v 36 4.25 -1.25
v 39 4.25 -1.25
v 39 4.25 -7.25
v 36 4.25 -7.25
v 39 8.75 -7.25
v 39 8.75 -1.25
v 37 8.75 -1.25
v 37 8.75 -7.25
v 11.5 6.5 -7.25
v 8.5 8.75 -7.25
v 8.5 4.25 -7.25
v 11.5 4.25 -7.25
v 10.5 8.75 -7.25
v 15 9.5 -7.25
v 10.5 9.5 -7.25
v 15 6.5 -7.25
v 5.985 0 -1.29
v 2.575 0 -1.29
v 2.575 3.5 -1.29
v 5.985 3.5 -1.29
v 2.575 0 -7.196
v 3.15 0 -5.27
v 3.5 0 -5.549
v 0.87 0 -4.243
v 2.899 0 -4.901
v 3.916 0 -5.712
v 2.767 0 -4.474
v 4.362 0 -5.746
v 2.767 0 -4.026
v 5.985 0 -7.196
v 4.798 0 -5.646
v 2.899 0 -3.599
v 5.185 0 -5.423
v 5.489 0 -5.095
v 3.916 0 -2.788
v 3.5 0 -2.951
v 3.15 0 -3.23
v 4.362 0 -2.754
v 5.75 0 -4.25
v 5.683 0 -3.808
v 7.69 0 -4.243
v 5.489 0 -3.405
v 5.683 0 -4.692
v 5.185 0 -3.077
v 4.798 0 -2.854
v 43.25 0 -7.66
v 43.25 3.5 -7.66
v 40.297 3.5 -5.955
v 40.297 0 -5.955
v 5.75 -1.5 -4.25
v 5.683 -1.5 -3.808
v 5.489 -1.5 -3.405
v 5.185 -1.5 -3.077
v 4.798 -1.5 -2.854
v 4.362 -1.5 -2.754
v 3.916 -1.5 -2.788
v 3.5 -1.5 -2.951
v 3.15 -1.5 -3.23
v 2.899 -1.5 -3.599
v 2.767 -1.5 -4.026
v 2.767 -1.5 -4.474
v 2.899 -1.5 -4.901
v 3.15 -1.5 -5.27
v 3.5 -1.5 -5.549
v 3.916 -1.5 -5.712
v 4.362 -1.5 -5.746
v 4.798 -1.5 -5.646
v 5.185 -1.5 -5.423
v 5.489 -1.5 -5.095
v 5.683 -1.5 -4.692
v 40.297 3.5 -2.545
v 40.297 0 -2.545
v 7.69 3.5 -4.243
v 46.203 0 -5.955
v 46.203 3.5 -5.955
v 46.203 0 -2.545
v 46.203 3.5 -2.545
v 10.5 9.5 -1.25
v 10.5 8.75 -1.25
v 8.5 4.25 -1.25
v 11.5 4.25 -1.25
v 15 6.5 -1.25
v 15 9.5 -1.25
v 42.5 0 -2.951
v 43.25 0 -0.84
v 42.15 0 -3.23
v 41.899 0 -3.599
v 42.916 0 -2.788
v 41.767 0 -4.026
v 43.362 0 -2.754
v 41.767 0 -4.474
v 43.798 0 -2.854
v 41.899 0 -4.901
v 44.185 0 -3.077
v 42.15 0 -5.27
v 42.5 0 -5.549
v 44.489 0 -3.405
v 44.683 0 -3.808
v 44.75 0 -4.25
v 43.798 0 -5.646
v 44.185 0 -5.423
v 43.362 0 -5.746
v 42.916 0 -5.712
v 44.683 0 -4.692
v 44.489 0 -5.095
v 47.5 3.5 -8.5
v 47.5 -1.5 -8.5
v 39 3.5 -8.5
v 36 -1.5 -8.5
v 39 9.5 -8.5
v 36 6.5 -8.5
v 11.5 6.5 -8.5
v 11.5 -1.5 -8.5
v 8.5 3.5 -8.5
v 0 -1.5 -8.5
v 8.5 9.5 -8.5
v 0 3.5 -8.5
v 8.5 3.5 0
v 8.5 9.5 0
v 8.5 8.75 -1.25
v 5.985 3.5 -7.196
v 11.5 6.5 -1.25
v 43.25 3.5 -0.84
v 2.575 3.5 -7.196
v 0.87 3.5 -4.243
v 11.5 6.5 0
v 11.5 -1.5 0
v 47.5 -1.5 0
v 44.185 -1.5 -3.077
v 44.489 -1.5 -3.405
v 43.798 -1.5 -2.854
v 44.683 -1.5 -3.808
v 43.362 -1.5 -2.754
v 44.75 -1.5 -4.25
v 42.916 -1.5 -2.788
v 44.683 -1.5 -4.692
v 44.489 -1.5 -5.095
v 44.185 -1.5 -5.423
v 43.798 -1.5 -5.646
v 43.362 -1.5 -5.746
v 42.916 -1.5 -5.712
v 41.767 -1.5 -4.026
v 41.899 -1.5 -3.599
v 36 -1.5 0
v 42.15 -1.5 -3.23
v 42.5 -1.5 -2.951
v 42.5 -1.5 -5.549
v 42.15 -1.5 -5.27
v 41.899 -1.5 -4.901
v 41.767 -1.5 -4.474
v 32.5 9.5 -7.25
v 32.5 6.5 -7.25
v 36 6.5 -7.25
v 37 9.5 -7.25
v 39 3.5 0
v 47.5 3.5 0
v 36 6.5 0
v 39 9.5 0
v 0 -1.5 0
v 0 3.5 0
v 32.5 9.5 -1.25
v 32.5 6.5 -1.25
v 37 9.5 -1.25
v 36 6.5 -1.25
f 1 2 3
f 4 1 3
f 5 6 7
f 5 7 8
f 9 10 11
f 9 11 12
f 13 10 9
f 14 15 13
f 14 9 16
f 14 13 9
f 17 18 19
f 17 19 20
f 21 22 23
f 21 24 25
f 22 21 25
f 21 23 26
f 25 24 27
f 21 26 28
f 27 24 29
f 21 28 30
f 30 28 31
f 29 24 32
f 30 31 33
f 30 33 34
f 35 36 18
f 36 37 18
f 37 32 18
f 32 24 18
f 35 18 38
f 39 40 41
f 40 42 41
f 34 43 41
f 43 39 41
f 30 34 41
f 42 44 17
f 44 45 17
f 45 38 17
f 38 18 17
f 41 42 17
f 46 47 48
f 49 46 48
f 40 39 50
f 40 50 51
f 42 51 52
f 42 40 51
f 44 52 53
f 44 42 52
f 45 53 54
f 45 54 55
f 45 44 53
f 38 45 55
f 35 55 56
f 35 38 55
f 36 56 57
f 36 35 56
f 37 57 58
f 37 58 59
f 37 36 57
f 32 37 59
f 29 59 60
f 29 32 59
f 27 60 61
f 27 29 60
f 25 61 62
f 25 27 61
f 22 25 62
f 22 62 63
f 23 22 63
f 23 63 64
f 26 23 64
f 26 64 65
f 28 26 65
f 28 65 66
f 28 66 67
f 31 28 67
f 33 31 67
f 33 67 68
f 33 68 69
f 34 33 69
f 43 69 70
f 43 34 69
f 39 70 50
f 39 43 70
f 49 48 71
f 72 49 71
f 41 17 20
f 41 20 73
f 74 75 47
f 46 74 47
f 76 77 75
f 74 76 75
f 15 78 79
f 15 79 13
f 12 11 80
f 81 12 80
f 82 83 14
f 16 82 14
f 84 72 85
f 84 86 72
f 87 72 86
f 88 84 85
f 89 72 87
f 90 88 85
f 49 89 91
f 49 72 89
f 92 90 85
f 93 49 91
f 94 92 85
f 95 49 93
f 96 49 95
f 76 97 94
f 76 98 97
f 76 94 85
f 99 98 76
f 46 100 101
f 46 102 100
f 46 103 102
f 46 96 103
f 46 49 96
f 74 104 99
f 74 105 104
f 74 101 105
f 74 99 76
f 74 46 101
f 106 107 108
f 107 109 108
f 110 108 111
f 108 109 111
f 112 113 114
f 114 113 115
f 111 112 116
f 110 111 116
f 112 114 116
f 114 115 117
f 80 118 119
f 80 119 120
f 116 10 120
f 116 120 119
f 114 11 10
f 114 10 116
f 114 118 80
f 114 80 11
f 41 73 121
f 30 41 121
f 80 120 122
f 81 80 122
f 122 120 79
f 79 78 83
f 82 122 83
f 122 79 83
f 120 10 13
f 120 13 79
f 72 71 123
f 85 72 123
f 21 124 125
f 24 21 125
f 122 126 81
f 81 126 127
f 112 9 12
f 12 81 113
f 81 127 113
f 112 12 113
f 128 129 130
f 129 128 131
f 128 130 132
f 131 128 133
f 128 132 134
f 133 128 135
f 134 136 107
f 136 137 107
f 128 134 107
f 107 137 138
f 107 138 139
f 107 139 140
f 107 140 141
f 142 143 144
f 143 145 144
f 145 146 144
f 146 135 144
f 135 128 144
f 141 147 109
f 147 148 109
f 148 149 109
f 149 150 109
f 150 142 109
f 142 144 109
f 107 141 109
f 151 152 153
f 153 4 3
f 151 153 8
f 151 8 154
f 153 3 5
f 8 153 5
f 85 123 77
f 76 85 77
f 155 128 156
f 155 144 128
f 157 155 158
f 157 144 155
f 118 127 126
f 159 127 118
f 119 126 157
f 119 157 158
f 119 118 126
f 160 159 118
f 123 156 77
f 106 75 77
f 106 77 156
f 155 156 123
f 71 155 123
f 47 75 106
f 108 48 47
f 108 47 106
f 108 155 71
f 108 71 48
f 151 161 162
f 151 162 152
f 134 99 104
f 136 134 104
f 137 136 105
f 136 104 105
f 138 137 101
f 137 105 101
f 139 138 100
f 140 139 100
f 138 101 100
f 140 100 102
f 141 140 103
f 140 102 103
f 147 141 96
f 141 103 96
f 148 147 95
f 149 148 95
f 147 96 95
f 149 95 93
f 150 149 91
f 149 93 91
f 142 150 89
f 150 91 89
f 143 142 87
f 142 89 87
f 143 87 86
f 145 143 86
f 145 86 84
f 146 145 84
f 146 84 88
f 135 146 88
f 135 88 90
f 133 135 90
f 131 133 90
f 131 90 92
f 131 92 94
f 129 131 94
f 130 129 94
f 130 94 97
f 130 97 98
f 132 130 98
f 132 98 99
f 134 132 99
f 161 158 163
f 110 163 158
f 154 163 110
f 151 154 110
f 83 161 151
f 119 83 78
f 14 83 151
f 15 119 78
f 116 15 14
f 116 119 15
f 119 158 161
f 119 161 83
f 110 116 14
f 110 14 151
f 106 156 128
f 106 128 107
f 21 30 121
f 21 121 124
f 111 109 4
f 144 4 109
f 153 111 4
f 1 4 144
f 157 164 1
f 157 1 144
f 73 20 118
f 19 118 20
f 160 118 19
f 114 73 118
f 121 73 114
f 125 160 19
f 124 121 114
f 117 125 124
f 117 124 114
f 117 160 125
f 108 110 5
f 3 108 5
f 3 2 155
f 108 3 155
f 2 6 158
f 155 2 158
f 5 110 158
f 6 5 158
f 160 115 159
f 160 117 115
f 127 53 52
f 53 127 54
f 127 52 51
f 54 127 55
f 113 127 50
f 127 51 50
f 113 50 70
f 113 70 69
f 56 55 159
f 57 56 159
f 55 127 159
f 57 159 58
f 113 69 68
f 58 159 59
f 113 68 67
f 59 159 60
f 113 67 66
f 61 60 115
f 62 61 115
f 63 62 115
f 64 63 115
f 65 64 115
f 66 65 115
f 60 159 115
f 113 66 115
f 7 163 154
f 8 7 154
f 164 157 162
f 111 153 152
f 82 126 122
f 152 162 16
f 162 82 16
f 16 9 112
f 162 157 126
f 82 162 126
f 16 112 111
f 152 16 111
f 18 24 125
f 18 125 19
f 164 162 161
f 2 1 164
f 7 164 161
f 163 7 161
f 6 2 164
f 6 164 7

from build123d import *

# Parameters (mm, degrees)
SKETCH1_W           = 8.5
SKETCH1_H           = 8.5
BOSS_EXTRUDE1_DEPTH = 3.5
SKETCH2_W           = 8.5
SKETCH2_H           = 8.5
SKETCH2_R           = 1.5
BOSS_EXTRUDE2_DEPTH = 1.5
SKETCH3_W           = 8.5
SKETCH3_H           = 5
BOSS_EXTRUDE3_DEPTH = 3
SKETCH4_W           = 3
SKETCH4_H           = 8.5
BOSS_EXTRUDE4_DEPTH = 6
SKETCH5_W           = 8.5
SKETCH5_H           = 3
BOSS_EXTRUDE5_DEPTH = 27.5
SKETCH6_W           = 3
SKETCH6_H           = 8.5
BOSS_EXTRUDE6_DEPTH = 8
SKETCH7_W           = 8.5
SKETCH7_H           = 5
BOSS_EXTRUDE7_DEPTH = 8.5
CUT_EXTRUDE1_DEPTH  = 3.5
SKETCH10_R          = 1.5
CUT_EXTRUDE3_DEPTH  = 3.5
SKETCH11_W          = 6
SKETCH11_H          = 4.5
CUT_EXTRUDE4_DEPTH  = 3.5
SKETCH12_W          = 4.5
SKETCH12_H          = 6
CUT_EXTRUDE5_DEPTH  = 3.5
SKETCH13_W          = 6
SKETCH13_H          = 4.5
CUT_EXTRUDE6_DEPTH  = 3.5
SKETCH14_W          = 4.5
SKETCH14_H          = 6
CUT_EXTRUDE7_DEPTH  = 3.5


with BuildPart() as part:
    # Sketch1 → Boss-Extrude1 (new body)
    with BuildSketch(Plane(origin=(0, 0, 0), x_dir=(1, 0, 0), z_dir=(0, 1, 0))):
        with Locations((4.25, 4.25)):
            Rectangle(SKETCH1_W, SKETCH1_H)
        Polygon((5.985496764, 7.195964334), (2.575496764, 7.195964334), (0.870496764, 4.242817707), (2.575496764, 1.28967108), (5.985496764, 1.28967108), (7.690496764, 4.242817707), align=None, mode=Mode.SUBTRACT)
    extrude(amount=BOSS_EXTRUDE1_DEPTH)

    # Sketch2 → Boss-Extrude2 (add)
    with BuildSketch(Plane.XZ):
        with Locations((4.25, -4.25)):
            Rectangle(SKETCH2_W, SKETCH2_H)
        with Locations((4.25, -4.25)):
            Circle(SKETCH2_R, mode=Mode.SUBTRACT)
    extrude(amount=BOSS_EXTRUDE2_DEPTH)

    # Sketch3 → Boss-Extrude3 (add)
    with BuildSketch(Plane(origin=(8.5, 0, 0), x_dir=(0, 0, -1), z_dir=(1, 0, 0))):
        with Locations((4.25, 1)):
            Rectangle(SKETCH3_W, SKETCH3_H)
    extrude(amount=BOSS_EXTRUDE3_DEPTH)

    # Sketch4 → Boss-Extrude4 (add)
    with BuildSketch(Plane(origin=(0, 3.5, 0), x_dir=(1, 0, 0), z_dir=(0, 1, 0))):
        with Locations((10, 4.25)):
            Rectangle(SKETCH4_W, SKETCH4_H)
    extrude(amount=BOSS_EXTRUDE4_DEPTH)

    # Sketch5 → Boss-Extrude5 (add)
    with BuildSketch(Plane(origin=(11.5, 0, 0), x_dir=(0, 0, -1), z_dir=(1, 0, 0))):
        with Locations((4.25, 8)):
            Rectangle(SKETCH5_W, SKETCH5_H)
    extrude(amount=BOSS_EXTRUDE5_DEPTH)

    # Sketch6 → Boss-Extrude6 (add)
    with BuildSketch(Plane.XZ.offset(-6.5)):
        with Locations((37.5, -4.25)):
            Rectangle(SKETCH6_W, SKETCH6_H)
    extrude(amount=BOSS_EXTRUDE6_DEPTH)

    # Sketch7 → Boss-Extrude7 (add)
    with BuildSketch(Plane(origin=(39, 0, 0), x_dir=(0, 0, -1), z_dir=(1, 0, 0))):
        with Locations((4.25, 1)):
            Rectangle(SKETCH7_W, SKETCH7_H)
    extrude(amount=BOSS_EXTRUDE7_DEPTH)

    # Sketch8 → Cut-Extrude1 (cut)
    with BuildSketch(Plane(origin=(0, 3.5, 0), x_dir=(1, 0, 0), z_dir=(0, 1, 0))):
        Polygon((46.203146627, 5.955), (43.25, 7.66), (40.296853373, 5.955), (40.296853373, 2.545), (43.25, 0.84), (46.203146627, 2.545), align=None)
    extrude(amount=-CUT_EXTRUDE1_DEPTH, mode=Mode.SUBTRACT)

    # Sketch10 → Cut-Extrude3 (cut)
    with BuildSketch(Plane(origin=(0, 0, 0), x_dir=(1, 0, 0), z_dir=(0, 1, 0))):
        with Locations((43.25, 4.25)):
            Circle(SKETCH10_R)
    extrude(amount=-CUT_EXTRUDE3_DEPTH, mode=Mode.SUBTRACT)

    # Sketch11 → Cut-Extrude4 (cut)
    with BuildSketch(Plane.ZY.offset(-8.5)):
        with Locations((-4.25, 6.5)):
            Rectangle(SKETCH11_W, SKETCH11_H)
    extrude(amount=-CUT_EXTRUDE4_DEPTH, mode=Mode.SUBTRACT)

    # Sketch12 → Cut-Extrude5 (cut)
    with BuildSketch(Plane(origin=(0, 9.5, 0), x_dir=(1, 0, 0), z_dir=(0, 1, 0))):
        with Locations((12.75, 4.25)):
            Rectangle(SKETCH12_W, SKETCH12_H)
    extrude(amount=-CUT_EXTRUDE5_DEPTH, mode=Mode.SUBTRACT)

    # Sketch13 → Cut-Extrude6 (cut)
    with BuildSketch(Plane(origin=(39, 0, 0), x_dir=(0, 0, -1), z_dir=(1, 0, 0))):
        with Locations((4.25, 6.5)):
            Rectangle(SKETCH13_W, SKETCH13_H)
    extrude(amount=-CUT_EXTRUDE6_DEPTH, mode=Mode.SUBTRACT)

    # Sketch14 → Cut-Extrude7 (cut)
    with BuildSketch(Plane(origin=(0, 9.5, 0), x_dir=(1, 0, 0), z_dir=(0, 1, 0))):
        with Locations((34.75, 4.25)):
            Rectangle(SKETCH14_W, SKETCH14_H)
    extrude(amount=-CUT_EXTRUDE7_DEPTH, mode=Mode.SUBTRACT)


solid = part.part
